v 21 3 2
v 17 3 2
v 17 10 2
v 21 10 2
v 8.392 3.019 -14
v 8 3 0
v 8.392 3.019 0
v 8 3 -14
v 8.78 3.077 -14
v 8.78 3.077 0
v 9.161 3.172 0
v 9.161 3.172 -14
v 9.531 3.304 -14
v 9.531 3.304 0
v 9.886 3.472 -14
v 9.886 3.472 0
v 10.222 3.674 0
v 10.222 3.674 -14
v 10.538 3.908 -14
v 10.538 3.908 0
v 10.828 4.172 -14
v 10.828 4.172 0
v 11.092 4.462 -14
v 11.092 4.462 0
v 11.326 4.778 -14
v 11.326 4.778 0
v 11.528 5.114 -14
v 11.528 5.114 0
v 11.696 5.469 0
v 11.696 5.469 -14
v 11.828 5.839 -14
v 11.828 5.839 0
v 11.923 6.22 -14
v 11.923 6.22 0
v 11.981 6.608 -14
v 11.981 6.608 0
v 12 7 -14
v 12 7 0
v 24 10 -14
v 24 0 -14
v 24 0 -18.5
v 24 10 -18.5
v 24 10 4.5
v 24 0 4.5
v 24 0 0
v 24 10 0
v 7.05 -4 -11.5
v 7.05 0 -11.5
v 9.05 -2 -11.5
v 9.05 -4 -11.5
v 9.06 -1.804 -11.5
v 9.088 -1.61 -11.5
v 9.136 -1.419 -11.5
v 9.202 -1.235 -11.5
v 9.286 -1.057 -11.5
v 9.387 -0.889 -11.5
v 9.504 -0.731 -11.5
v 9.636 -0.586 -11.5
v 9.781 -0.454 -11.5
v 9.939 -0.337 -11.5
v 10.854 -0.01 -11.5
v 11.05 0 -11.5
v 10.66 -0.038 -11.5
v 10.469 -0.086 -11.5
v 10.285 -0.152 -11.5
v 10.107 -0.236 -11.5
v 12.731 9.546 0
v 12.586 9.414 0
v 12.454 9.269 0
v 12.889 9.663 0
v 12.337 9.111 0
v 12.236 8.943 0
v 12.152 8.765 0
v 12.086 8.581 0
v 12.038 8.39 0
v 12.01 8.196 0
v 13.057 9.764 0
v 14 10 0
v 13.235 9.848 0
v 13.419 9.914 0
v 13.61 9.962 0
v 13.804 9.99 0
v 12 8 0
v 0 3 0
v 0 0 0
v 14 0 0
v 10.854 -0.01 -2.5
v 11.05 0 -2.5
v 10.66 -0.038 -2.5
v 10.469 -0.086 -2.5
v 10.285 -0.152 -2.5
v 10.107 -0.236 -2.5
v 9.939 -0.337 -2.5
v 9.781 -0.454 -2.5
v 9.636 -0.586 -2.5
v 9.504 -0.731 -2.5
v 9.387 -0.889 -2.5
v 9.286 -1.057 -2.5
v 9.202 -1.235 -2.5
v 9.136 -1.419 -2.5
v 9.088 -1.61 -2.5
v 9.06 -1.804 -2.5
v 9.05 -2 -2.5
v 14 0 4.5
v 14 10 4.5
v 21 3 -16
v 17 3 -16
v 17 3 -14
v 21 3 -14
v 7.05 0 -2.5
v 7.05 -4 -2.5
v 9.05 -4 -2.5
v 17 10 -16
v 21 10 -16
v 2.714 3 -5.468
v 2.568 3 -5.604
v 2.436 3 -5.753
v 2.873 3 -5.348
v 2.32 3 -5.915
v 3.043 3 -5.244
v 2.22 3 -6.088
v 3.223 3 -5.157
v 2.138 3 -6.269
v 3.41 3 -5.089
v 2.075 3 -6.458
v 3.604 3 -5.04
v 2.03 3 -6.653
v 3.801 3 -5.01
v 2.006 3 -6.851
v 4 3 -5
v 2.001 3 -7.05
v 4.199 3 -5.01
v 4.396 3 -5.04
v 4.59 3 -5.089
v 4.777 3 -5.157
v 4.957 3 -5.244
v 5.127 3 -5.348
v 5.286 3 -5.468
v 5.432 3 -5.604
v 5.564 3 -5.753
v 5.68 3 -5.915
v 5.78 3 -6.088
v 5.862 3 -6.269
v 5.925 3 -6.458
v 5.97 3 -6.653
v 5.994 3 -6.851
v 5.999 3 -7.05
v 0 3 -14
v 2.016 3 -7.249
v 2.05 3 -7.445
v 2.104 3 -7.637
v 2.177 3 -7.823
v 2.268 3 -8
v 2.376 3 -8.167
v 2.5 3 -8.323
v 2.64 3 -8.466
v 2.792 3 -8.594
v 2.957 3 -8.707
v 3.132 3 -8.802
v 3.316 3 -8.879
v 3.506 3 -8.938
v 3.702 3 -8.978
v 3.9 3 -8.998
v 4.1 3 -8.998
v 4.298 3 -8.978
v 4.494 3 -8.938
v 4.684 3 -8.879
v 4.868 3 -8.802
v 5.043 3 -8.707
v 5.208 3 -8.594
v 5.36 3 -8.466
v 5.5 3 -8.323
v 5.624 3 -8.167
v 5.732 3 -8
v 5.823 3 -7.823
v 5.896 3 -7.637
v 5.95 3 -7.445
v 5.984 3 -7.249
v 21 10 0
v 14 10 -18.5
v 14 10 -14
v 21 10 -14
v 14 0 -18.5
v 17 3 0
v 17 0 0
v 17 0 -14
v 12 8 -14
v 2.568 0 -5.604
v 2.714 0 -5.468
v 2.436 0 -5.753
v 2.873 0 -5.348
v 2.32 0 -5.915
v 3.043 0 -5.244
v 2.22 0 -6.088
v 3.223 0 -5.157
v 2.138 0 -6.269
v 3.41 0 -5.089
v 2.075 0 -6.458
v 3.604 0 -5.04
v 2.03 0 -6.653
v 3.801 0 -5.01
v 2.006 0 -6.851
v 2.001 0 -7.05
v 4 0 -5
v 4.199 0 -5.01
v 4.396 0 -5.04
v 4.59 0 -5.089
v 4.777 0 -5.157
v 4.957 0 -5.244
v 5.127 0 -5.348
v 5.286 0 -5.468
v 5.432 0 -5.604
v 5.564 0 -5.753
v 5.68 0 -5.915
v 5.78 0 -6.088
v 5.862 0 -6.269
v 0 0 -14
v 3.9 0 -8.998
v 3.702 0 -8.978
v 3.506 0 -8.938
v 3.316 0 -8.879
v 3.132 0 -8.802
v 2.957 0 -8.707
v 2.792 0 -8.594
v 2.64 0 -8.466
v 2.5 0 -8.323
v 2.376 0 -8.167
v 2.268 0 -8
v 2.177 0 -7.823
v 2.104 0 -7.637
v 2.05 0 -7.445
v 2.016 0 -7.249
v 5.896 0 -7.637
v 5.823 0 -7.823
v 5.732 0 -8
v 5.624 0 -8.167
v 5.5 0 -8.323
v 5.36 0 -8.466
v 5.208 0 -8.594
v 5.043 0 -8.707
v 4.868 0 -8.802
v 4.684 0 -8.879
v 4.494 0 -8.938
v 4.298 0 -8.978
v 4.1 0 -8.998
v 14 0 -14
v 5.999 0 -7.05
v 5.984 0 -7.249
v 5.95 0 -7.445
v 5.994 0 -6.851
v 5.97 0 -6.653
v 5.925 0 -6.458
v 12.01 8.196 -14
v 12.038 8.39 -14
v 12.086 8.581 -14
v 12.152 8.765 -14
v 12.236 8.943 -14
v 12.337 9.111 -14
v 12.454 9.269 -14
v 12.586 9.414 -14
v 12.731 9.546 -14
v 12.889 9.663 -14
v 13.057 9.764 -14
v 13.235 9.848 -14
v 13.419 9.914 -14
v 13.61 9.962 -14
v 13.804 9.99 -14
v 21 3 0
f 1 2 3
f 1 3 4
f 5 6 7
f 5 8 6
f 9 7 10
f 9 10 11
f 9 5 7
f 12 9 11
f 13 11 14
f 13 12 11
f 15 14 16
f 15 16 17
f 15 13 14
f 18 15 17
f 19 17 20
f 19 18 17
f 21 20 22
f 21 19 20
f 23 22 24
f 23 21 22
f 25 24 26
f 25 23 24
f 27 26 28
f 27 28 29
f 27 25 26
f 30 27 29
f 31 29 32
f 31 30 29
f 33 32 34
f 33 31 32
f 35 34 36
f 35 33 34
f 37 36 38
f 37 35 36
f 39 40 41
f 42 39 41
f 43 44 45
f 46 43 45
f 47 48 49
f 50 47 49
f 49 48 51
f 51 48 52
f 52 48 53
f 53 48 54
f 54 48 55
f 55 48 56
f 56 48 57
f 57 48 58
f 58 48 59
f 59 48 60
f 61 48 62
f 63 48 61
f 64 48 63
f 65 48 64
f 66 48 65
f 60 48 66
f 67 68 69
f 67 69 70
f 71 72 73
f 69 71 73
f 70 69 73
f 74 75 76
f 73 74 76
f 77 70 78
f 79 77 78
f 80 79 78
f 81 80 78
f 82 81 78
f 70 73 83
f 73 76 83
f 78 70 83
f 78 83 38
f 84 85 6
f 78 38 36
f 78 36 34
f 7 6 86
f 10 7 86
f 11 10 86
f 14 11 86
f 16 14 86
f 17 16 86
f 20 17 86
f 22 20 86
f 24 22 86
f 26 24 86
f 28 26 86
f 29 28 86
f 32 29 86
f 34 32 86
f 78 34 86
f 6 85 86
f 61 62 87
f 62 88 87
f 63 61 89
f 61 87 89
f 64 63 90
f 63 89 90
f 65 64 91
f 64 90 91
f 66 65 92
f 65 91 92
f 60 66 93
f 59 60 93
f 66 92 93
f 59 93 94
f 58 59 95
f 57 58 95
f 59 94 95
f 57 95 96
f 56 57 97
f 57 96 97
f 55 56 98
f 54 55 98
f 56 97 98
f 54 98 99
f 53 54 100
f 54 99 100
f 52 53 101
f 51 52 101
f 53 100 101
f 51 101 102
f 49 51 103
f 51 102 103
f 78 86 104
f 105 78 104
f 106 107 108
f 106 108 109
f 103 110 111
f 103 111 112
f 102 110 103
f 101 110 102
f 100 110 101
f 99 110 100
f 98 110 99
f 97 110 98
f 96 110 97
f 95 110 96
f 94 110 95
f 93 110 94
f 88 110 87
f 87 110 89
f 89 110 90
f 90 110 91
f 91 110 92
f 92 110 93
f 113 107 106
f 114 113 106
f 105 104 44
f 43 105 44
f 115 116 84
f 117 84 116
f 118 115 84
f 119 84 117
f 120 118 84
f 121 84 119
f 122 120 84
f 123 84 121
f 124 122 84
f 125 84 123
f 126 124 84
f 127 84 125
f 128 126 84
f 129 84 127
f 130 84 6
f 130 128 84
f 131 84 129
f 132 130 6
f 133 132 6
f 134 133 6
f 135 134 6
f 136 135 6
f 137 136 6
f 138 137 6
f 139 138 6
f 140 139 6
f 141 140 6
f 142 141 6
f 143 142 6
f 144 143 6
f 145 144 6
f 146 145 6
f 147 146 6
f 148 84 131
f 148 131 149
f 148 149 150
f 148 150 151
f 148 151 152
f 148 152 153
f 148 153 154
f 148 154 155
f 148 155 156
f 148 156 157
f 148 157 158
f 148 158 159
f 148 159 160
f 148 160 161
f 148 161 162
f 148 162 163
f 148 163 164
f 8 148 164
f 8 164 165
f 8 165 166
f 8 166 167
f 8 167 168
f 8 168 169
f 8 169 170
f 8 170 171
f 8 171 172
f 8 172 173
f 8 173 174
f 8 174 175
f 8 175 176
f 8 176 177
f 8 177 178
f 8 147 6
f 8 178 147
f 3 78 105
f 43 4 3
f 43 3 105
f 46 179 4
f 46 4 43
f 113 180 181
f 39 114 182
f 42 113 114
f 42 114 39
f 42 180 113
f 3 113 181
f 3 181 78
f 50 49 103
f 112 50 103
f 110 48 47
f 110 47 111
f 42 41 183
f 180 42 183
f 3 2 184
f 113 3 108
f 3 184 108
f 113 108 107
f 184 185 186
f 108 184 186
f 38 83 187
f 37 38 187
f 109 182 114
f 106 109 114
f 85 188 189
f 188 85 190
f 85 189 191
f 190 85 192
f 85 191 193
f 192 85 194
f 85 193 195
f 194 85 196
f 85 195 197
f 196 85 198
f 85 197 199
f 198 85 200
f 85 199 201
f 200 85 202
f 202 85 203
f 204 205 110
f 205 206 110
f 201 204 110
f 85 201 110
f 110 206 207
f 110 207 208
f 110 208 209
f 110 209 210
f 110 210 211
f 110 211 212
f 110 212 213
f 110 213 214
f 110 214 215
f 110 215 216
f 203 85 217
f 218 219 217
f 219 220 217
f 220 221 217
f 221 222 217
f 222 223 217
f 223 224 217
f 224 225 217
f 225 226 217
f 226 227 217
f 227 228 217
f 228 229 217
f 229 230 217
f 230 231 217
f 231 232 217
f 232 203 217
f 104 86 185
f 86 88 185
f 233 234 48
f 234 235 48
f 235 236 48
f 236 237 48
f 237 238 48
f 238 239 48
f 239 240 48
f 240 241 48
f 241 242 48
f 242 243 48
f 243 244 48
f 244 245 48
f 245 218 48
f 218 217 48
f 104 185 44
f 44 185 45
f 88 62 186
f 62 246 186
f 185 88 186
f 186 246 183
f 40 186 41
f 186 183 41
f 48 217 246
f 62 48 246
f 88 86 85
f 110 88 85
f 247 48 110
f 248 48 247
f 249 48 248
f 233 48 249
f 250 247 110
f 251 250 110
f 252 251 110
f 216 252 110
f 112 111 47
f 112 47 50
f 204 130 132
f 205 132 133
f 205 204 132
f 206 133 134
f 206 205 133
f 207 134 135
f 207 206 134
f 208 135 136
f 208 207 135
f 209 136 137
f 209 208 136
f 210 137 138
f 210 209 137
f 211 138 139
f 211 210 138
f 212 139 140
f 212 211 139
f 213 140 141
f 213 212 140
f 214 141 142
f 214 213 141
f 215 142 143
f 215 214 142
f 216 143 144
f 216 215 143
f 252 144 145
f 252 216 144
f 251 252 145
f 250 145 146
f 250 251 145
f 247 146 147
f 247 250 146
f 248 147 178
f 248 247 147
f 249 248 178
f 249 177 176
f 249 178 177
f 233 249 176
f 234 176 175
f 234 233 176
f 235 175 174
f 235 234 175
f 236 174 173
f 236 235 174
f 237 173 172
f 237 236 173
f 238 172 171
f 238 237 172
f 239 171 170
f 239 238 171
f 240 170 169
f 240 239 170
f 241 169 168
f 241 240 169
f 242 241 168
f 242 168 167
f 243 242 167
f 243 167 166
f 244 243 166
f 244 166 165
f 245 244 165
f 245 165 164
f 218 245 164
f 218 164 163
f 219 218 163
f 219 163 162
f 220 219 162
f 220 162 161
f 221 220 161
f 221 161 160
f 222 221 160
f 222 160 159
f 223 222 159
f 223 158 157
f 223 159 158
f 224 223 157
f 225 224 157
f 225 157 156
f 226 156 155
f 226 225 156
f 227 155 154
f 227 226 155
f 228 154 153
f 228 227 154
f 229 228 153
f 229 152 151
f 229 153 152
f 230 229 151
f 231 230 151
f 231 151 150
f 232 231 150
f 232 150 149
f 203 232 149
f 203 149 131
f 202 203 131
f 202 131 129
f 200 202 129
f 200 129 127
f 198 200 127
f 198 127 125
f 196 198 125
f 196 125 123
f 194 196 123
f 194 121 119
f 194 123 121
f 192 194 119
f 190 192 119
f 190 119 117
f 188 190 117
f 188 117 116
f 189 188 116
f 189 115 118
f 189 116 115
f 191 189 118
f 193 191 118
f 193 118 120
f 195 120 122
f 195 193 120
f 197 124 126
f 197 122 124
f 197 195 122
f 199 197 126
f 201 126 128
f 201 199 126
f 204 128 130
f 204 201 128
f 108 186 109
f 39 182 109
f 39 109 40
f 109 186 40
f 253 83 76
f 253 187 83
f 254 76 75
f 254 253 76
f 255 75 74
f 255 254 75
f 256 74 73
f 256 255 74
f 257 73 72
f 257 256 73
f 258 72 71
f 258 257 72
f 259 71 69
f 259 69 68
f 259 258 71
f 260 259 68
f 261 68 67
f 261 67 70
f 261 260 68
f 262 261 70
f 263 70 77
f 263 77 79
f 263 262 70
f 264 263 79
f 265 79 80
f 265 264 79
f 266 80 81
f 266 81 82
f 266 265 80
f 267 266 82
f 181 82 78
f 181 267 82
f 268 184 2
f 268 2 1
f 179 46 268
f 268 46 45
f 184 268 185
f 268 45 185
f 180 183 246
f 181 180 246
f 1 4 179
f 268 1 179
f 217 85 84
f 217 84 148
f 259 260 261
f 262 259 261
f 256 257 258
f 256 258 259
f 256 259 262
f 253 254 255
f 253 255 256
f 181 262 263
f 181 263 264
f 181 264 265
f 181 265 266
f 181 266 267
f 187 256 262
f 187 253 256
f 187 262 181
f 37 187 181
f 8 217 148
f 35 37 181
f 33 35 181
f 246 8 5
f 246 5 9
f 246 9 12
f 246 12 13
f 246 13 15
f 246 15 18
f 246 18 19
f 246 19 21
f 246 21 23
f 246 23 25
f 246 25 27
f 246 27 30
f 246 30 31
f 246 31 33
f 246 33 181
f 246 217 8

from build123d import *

# Parameters (mm, degrees)
SKETCH1_W           = 14
SKETCH1_H           = 14
SKETCH1_R           = 2
BOSS_EXTRUDE1_DEPTH = 10
SKETCH3_W           = 4
SKETCH3_H           = 18
SKETCH3_W_2         = 12
SKETCH3_H_2         = 14
CUT_EXTRUDE1_DEPTH  = 7
FILLET1_R           = 4
FILLET2_R           = 2
SKETCH4_W           = 2
SKETCH4_H           = 9
BOSS_EXTRUDE2_DEPTH = 4
FILLET3_R           = 2


with BuildPart() as part:
    # Sketch1 → Boss-Extrude1 (new body)
    # profile 1 of 2: a face of its own
    with BuildSketch(Plane(origin=(0, 0, 0), x_dir=(1, 0, 0), z_dir=(0, 1, 0))):
        Polygon((14, 14), (14, 0), (14, -4.5), (24, -4.5), (24, 0), (17, 0), (17, 14), (24, 14), (24, 18.5), (14, 18.5), align=None)
    # profile 2 of 2: a face of its own
    with BuildSketch(Plane(origin=(0, 0, 0), x_dir=(1, 0, 0), z_dir=(0, 1, 0))):
        with Locations((7, 7)):
            Rectangle(SKETCH1_W, SKETCH1_H)
        with Locations(Location((4, 7, 0), (0, 0, 270))):
            Circle(SKETCH1_R, mode=Mode.SUBTRACT)
    extrude(amount=BOSS_EXTRUDE1_DEPTH)

    # Sketch3 → Cut-Extrude1 (cut)
    with BuildSketch(Plane(origin=(0, 10, 0), x_dir=(1, 0, 0), z_dir=(0, 1, 0))):
        with Locations((19, 7)):
            Rectangle(SKETCH3_W, SKETCH3_H)
        with Locations((6, 7)):
            Rectangle(SKETCH3_W_2, SKETCH3_H_2)
    extrude(amount=-CUT_EXTRUDE1_DEPTH, mode=Mode.SUBTRACT)

    # Fillet1
    fillet1_edges = [part.edges().sort_by_distance(p)[0] for p in [
        (12, 3, -7),
    ]]
    fillet(fillet1_edges, radius=FILLET1_R)

    # Fillet2
    fillet2_edges = [part.edges().sort_by_distance(p)[0] for p in [
        (12, 10, -7),
    ]]
    fillet(fillet2_edges, radius=FILLET2_R)

    # Sketch4 → Boss-Extrude2 (add)
    with BuildSketch(Plane.XZ):
        with Locations((8.05, -7)):
            Rectangle(SKETCH4_W, SKETCH4_H)
    extrude(amount=BOSS_EXTRUDE2_DEPTH)

    # Fillet3
    fillet3_edges = [part.edges().sort_by_distance(p)[0] for p in [
        (9.05, 0, -7),
    ]]
    fillet(fillet3_edges, radius=FILLET3_R)


solid = part.part
